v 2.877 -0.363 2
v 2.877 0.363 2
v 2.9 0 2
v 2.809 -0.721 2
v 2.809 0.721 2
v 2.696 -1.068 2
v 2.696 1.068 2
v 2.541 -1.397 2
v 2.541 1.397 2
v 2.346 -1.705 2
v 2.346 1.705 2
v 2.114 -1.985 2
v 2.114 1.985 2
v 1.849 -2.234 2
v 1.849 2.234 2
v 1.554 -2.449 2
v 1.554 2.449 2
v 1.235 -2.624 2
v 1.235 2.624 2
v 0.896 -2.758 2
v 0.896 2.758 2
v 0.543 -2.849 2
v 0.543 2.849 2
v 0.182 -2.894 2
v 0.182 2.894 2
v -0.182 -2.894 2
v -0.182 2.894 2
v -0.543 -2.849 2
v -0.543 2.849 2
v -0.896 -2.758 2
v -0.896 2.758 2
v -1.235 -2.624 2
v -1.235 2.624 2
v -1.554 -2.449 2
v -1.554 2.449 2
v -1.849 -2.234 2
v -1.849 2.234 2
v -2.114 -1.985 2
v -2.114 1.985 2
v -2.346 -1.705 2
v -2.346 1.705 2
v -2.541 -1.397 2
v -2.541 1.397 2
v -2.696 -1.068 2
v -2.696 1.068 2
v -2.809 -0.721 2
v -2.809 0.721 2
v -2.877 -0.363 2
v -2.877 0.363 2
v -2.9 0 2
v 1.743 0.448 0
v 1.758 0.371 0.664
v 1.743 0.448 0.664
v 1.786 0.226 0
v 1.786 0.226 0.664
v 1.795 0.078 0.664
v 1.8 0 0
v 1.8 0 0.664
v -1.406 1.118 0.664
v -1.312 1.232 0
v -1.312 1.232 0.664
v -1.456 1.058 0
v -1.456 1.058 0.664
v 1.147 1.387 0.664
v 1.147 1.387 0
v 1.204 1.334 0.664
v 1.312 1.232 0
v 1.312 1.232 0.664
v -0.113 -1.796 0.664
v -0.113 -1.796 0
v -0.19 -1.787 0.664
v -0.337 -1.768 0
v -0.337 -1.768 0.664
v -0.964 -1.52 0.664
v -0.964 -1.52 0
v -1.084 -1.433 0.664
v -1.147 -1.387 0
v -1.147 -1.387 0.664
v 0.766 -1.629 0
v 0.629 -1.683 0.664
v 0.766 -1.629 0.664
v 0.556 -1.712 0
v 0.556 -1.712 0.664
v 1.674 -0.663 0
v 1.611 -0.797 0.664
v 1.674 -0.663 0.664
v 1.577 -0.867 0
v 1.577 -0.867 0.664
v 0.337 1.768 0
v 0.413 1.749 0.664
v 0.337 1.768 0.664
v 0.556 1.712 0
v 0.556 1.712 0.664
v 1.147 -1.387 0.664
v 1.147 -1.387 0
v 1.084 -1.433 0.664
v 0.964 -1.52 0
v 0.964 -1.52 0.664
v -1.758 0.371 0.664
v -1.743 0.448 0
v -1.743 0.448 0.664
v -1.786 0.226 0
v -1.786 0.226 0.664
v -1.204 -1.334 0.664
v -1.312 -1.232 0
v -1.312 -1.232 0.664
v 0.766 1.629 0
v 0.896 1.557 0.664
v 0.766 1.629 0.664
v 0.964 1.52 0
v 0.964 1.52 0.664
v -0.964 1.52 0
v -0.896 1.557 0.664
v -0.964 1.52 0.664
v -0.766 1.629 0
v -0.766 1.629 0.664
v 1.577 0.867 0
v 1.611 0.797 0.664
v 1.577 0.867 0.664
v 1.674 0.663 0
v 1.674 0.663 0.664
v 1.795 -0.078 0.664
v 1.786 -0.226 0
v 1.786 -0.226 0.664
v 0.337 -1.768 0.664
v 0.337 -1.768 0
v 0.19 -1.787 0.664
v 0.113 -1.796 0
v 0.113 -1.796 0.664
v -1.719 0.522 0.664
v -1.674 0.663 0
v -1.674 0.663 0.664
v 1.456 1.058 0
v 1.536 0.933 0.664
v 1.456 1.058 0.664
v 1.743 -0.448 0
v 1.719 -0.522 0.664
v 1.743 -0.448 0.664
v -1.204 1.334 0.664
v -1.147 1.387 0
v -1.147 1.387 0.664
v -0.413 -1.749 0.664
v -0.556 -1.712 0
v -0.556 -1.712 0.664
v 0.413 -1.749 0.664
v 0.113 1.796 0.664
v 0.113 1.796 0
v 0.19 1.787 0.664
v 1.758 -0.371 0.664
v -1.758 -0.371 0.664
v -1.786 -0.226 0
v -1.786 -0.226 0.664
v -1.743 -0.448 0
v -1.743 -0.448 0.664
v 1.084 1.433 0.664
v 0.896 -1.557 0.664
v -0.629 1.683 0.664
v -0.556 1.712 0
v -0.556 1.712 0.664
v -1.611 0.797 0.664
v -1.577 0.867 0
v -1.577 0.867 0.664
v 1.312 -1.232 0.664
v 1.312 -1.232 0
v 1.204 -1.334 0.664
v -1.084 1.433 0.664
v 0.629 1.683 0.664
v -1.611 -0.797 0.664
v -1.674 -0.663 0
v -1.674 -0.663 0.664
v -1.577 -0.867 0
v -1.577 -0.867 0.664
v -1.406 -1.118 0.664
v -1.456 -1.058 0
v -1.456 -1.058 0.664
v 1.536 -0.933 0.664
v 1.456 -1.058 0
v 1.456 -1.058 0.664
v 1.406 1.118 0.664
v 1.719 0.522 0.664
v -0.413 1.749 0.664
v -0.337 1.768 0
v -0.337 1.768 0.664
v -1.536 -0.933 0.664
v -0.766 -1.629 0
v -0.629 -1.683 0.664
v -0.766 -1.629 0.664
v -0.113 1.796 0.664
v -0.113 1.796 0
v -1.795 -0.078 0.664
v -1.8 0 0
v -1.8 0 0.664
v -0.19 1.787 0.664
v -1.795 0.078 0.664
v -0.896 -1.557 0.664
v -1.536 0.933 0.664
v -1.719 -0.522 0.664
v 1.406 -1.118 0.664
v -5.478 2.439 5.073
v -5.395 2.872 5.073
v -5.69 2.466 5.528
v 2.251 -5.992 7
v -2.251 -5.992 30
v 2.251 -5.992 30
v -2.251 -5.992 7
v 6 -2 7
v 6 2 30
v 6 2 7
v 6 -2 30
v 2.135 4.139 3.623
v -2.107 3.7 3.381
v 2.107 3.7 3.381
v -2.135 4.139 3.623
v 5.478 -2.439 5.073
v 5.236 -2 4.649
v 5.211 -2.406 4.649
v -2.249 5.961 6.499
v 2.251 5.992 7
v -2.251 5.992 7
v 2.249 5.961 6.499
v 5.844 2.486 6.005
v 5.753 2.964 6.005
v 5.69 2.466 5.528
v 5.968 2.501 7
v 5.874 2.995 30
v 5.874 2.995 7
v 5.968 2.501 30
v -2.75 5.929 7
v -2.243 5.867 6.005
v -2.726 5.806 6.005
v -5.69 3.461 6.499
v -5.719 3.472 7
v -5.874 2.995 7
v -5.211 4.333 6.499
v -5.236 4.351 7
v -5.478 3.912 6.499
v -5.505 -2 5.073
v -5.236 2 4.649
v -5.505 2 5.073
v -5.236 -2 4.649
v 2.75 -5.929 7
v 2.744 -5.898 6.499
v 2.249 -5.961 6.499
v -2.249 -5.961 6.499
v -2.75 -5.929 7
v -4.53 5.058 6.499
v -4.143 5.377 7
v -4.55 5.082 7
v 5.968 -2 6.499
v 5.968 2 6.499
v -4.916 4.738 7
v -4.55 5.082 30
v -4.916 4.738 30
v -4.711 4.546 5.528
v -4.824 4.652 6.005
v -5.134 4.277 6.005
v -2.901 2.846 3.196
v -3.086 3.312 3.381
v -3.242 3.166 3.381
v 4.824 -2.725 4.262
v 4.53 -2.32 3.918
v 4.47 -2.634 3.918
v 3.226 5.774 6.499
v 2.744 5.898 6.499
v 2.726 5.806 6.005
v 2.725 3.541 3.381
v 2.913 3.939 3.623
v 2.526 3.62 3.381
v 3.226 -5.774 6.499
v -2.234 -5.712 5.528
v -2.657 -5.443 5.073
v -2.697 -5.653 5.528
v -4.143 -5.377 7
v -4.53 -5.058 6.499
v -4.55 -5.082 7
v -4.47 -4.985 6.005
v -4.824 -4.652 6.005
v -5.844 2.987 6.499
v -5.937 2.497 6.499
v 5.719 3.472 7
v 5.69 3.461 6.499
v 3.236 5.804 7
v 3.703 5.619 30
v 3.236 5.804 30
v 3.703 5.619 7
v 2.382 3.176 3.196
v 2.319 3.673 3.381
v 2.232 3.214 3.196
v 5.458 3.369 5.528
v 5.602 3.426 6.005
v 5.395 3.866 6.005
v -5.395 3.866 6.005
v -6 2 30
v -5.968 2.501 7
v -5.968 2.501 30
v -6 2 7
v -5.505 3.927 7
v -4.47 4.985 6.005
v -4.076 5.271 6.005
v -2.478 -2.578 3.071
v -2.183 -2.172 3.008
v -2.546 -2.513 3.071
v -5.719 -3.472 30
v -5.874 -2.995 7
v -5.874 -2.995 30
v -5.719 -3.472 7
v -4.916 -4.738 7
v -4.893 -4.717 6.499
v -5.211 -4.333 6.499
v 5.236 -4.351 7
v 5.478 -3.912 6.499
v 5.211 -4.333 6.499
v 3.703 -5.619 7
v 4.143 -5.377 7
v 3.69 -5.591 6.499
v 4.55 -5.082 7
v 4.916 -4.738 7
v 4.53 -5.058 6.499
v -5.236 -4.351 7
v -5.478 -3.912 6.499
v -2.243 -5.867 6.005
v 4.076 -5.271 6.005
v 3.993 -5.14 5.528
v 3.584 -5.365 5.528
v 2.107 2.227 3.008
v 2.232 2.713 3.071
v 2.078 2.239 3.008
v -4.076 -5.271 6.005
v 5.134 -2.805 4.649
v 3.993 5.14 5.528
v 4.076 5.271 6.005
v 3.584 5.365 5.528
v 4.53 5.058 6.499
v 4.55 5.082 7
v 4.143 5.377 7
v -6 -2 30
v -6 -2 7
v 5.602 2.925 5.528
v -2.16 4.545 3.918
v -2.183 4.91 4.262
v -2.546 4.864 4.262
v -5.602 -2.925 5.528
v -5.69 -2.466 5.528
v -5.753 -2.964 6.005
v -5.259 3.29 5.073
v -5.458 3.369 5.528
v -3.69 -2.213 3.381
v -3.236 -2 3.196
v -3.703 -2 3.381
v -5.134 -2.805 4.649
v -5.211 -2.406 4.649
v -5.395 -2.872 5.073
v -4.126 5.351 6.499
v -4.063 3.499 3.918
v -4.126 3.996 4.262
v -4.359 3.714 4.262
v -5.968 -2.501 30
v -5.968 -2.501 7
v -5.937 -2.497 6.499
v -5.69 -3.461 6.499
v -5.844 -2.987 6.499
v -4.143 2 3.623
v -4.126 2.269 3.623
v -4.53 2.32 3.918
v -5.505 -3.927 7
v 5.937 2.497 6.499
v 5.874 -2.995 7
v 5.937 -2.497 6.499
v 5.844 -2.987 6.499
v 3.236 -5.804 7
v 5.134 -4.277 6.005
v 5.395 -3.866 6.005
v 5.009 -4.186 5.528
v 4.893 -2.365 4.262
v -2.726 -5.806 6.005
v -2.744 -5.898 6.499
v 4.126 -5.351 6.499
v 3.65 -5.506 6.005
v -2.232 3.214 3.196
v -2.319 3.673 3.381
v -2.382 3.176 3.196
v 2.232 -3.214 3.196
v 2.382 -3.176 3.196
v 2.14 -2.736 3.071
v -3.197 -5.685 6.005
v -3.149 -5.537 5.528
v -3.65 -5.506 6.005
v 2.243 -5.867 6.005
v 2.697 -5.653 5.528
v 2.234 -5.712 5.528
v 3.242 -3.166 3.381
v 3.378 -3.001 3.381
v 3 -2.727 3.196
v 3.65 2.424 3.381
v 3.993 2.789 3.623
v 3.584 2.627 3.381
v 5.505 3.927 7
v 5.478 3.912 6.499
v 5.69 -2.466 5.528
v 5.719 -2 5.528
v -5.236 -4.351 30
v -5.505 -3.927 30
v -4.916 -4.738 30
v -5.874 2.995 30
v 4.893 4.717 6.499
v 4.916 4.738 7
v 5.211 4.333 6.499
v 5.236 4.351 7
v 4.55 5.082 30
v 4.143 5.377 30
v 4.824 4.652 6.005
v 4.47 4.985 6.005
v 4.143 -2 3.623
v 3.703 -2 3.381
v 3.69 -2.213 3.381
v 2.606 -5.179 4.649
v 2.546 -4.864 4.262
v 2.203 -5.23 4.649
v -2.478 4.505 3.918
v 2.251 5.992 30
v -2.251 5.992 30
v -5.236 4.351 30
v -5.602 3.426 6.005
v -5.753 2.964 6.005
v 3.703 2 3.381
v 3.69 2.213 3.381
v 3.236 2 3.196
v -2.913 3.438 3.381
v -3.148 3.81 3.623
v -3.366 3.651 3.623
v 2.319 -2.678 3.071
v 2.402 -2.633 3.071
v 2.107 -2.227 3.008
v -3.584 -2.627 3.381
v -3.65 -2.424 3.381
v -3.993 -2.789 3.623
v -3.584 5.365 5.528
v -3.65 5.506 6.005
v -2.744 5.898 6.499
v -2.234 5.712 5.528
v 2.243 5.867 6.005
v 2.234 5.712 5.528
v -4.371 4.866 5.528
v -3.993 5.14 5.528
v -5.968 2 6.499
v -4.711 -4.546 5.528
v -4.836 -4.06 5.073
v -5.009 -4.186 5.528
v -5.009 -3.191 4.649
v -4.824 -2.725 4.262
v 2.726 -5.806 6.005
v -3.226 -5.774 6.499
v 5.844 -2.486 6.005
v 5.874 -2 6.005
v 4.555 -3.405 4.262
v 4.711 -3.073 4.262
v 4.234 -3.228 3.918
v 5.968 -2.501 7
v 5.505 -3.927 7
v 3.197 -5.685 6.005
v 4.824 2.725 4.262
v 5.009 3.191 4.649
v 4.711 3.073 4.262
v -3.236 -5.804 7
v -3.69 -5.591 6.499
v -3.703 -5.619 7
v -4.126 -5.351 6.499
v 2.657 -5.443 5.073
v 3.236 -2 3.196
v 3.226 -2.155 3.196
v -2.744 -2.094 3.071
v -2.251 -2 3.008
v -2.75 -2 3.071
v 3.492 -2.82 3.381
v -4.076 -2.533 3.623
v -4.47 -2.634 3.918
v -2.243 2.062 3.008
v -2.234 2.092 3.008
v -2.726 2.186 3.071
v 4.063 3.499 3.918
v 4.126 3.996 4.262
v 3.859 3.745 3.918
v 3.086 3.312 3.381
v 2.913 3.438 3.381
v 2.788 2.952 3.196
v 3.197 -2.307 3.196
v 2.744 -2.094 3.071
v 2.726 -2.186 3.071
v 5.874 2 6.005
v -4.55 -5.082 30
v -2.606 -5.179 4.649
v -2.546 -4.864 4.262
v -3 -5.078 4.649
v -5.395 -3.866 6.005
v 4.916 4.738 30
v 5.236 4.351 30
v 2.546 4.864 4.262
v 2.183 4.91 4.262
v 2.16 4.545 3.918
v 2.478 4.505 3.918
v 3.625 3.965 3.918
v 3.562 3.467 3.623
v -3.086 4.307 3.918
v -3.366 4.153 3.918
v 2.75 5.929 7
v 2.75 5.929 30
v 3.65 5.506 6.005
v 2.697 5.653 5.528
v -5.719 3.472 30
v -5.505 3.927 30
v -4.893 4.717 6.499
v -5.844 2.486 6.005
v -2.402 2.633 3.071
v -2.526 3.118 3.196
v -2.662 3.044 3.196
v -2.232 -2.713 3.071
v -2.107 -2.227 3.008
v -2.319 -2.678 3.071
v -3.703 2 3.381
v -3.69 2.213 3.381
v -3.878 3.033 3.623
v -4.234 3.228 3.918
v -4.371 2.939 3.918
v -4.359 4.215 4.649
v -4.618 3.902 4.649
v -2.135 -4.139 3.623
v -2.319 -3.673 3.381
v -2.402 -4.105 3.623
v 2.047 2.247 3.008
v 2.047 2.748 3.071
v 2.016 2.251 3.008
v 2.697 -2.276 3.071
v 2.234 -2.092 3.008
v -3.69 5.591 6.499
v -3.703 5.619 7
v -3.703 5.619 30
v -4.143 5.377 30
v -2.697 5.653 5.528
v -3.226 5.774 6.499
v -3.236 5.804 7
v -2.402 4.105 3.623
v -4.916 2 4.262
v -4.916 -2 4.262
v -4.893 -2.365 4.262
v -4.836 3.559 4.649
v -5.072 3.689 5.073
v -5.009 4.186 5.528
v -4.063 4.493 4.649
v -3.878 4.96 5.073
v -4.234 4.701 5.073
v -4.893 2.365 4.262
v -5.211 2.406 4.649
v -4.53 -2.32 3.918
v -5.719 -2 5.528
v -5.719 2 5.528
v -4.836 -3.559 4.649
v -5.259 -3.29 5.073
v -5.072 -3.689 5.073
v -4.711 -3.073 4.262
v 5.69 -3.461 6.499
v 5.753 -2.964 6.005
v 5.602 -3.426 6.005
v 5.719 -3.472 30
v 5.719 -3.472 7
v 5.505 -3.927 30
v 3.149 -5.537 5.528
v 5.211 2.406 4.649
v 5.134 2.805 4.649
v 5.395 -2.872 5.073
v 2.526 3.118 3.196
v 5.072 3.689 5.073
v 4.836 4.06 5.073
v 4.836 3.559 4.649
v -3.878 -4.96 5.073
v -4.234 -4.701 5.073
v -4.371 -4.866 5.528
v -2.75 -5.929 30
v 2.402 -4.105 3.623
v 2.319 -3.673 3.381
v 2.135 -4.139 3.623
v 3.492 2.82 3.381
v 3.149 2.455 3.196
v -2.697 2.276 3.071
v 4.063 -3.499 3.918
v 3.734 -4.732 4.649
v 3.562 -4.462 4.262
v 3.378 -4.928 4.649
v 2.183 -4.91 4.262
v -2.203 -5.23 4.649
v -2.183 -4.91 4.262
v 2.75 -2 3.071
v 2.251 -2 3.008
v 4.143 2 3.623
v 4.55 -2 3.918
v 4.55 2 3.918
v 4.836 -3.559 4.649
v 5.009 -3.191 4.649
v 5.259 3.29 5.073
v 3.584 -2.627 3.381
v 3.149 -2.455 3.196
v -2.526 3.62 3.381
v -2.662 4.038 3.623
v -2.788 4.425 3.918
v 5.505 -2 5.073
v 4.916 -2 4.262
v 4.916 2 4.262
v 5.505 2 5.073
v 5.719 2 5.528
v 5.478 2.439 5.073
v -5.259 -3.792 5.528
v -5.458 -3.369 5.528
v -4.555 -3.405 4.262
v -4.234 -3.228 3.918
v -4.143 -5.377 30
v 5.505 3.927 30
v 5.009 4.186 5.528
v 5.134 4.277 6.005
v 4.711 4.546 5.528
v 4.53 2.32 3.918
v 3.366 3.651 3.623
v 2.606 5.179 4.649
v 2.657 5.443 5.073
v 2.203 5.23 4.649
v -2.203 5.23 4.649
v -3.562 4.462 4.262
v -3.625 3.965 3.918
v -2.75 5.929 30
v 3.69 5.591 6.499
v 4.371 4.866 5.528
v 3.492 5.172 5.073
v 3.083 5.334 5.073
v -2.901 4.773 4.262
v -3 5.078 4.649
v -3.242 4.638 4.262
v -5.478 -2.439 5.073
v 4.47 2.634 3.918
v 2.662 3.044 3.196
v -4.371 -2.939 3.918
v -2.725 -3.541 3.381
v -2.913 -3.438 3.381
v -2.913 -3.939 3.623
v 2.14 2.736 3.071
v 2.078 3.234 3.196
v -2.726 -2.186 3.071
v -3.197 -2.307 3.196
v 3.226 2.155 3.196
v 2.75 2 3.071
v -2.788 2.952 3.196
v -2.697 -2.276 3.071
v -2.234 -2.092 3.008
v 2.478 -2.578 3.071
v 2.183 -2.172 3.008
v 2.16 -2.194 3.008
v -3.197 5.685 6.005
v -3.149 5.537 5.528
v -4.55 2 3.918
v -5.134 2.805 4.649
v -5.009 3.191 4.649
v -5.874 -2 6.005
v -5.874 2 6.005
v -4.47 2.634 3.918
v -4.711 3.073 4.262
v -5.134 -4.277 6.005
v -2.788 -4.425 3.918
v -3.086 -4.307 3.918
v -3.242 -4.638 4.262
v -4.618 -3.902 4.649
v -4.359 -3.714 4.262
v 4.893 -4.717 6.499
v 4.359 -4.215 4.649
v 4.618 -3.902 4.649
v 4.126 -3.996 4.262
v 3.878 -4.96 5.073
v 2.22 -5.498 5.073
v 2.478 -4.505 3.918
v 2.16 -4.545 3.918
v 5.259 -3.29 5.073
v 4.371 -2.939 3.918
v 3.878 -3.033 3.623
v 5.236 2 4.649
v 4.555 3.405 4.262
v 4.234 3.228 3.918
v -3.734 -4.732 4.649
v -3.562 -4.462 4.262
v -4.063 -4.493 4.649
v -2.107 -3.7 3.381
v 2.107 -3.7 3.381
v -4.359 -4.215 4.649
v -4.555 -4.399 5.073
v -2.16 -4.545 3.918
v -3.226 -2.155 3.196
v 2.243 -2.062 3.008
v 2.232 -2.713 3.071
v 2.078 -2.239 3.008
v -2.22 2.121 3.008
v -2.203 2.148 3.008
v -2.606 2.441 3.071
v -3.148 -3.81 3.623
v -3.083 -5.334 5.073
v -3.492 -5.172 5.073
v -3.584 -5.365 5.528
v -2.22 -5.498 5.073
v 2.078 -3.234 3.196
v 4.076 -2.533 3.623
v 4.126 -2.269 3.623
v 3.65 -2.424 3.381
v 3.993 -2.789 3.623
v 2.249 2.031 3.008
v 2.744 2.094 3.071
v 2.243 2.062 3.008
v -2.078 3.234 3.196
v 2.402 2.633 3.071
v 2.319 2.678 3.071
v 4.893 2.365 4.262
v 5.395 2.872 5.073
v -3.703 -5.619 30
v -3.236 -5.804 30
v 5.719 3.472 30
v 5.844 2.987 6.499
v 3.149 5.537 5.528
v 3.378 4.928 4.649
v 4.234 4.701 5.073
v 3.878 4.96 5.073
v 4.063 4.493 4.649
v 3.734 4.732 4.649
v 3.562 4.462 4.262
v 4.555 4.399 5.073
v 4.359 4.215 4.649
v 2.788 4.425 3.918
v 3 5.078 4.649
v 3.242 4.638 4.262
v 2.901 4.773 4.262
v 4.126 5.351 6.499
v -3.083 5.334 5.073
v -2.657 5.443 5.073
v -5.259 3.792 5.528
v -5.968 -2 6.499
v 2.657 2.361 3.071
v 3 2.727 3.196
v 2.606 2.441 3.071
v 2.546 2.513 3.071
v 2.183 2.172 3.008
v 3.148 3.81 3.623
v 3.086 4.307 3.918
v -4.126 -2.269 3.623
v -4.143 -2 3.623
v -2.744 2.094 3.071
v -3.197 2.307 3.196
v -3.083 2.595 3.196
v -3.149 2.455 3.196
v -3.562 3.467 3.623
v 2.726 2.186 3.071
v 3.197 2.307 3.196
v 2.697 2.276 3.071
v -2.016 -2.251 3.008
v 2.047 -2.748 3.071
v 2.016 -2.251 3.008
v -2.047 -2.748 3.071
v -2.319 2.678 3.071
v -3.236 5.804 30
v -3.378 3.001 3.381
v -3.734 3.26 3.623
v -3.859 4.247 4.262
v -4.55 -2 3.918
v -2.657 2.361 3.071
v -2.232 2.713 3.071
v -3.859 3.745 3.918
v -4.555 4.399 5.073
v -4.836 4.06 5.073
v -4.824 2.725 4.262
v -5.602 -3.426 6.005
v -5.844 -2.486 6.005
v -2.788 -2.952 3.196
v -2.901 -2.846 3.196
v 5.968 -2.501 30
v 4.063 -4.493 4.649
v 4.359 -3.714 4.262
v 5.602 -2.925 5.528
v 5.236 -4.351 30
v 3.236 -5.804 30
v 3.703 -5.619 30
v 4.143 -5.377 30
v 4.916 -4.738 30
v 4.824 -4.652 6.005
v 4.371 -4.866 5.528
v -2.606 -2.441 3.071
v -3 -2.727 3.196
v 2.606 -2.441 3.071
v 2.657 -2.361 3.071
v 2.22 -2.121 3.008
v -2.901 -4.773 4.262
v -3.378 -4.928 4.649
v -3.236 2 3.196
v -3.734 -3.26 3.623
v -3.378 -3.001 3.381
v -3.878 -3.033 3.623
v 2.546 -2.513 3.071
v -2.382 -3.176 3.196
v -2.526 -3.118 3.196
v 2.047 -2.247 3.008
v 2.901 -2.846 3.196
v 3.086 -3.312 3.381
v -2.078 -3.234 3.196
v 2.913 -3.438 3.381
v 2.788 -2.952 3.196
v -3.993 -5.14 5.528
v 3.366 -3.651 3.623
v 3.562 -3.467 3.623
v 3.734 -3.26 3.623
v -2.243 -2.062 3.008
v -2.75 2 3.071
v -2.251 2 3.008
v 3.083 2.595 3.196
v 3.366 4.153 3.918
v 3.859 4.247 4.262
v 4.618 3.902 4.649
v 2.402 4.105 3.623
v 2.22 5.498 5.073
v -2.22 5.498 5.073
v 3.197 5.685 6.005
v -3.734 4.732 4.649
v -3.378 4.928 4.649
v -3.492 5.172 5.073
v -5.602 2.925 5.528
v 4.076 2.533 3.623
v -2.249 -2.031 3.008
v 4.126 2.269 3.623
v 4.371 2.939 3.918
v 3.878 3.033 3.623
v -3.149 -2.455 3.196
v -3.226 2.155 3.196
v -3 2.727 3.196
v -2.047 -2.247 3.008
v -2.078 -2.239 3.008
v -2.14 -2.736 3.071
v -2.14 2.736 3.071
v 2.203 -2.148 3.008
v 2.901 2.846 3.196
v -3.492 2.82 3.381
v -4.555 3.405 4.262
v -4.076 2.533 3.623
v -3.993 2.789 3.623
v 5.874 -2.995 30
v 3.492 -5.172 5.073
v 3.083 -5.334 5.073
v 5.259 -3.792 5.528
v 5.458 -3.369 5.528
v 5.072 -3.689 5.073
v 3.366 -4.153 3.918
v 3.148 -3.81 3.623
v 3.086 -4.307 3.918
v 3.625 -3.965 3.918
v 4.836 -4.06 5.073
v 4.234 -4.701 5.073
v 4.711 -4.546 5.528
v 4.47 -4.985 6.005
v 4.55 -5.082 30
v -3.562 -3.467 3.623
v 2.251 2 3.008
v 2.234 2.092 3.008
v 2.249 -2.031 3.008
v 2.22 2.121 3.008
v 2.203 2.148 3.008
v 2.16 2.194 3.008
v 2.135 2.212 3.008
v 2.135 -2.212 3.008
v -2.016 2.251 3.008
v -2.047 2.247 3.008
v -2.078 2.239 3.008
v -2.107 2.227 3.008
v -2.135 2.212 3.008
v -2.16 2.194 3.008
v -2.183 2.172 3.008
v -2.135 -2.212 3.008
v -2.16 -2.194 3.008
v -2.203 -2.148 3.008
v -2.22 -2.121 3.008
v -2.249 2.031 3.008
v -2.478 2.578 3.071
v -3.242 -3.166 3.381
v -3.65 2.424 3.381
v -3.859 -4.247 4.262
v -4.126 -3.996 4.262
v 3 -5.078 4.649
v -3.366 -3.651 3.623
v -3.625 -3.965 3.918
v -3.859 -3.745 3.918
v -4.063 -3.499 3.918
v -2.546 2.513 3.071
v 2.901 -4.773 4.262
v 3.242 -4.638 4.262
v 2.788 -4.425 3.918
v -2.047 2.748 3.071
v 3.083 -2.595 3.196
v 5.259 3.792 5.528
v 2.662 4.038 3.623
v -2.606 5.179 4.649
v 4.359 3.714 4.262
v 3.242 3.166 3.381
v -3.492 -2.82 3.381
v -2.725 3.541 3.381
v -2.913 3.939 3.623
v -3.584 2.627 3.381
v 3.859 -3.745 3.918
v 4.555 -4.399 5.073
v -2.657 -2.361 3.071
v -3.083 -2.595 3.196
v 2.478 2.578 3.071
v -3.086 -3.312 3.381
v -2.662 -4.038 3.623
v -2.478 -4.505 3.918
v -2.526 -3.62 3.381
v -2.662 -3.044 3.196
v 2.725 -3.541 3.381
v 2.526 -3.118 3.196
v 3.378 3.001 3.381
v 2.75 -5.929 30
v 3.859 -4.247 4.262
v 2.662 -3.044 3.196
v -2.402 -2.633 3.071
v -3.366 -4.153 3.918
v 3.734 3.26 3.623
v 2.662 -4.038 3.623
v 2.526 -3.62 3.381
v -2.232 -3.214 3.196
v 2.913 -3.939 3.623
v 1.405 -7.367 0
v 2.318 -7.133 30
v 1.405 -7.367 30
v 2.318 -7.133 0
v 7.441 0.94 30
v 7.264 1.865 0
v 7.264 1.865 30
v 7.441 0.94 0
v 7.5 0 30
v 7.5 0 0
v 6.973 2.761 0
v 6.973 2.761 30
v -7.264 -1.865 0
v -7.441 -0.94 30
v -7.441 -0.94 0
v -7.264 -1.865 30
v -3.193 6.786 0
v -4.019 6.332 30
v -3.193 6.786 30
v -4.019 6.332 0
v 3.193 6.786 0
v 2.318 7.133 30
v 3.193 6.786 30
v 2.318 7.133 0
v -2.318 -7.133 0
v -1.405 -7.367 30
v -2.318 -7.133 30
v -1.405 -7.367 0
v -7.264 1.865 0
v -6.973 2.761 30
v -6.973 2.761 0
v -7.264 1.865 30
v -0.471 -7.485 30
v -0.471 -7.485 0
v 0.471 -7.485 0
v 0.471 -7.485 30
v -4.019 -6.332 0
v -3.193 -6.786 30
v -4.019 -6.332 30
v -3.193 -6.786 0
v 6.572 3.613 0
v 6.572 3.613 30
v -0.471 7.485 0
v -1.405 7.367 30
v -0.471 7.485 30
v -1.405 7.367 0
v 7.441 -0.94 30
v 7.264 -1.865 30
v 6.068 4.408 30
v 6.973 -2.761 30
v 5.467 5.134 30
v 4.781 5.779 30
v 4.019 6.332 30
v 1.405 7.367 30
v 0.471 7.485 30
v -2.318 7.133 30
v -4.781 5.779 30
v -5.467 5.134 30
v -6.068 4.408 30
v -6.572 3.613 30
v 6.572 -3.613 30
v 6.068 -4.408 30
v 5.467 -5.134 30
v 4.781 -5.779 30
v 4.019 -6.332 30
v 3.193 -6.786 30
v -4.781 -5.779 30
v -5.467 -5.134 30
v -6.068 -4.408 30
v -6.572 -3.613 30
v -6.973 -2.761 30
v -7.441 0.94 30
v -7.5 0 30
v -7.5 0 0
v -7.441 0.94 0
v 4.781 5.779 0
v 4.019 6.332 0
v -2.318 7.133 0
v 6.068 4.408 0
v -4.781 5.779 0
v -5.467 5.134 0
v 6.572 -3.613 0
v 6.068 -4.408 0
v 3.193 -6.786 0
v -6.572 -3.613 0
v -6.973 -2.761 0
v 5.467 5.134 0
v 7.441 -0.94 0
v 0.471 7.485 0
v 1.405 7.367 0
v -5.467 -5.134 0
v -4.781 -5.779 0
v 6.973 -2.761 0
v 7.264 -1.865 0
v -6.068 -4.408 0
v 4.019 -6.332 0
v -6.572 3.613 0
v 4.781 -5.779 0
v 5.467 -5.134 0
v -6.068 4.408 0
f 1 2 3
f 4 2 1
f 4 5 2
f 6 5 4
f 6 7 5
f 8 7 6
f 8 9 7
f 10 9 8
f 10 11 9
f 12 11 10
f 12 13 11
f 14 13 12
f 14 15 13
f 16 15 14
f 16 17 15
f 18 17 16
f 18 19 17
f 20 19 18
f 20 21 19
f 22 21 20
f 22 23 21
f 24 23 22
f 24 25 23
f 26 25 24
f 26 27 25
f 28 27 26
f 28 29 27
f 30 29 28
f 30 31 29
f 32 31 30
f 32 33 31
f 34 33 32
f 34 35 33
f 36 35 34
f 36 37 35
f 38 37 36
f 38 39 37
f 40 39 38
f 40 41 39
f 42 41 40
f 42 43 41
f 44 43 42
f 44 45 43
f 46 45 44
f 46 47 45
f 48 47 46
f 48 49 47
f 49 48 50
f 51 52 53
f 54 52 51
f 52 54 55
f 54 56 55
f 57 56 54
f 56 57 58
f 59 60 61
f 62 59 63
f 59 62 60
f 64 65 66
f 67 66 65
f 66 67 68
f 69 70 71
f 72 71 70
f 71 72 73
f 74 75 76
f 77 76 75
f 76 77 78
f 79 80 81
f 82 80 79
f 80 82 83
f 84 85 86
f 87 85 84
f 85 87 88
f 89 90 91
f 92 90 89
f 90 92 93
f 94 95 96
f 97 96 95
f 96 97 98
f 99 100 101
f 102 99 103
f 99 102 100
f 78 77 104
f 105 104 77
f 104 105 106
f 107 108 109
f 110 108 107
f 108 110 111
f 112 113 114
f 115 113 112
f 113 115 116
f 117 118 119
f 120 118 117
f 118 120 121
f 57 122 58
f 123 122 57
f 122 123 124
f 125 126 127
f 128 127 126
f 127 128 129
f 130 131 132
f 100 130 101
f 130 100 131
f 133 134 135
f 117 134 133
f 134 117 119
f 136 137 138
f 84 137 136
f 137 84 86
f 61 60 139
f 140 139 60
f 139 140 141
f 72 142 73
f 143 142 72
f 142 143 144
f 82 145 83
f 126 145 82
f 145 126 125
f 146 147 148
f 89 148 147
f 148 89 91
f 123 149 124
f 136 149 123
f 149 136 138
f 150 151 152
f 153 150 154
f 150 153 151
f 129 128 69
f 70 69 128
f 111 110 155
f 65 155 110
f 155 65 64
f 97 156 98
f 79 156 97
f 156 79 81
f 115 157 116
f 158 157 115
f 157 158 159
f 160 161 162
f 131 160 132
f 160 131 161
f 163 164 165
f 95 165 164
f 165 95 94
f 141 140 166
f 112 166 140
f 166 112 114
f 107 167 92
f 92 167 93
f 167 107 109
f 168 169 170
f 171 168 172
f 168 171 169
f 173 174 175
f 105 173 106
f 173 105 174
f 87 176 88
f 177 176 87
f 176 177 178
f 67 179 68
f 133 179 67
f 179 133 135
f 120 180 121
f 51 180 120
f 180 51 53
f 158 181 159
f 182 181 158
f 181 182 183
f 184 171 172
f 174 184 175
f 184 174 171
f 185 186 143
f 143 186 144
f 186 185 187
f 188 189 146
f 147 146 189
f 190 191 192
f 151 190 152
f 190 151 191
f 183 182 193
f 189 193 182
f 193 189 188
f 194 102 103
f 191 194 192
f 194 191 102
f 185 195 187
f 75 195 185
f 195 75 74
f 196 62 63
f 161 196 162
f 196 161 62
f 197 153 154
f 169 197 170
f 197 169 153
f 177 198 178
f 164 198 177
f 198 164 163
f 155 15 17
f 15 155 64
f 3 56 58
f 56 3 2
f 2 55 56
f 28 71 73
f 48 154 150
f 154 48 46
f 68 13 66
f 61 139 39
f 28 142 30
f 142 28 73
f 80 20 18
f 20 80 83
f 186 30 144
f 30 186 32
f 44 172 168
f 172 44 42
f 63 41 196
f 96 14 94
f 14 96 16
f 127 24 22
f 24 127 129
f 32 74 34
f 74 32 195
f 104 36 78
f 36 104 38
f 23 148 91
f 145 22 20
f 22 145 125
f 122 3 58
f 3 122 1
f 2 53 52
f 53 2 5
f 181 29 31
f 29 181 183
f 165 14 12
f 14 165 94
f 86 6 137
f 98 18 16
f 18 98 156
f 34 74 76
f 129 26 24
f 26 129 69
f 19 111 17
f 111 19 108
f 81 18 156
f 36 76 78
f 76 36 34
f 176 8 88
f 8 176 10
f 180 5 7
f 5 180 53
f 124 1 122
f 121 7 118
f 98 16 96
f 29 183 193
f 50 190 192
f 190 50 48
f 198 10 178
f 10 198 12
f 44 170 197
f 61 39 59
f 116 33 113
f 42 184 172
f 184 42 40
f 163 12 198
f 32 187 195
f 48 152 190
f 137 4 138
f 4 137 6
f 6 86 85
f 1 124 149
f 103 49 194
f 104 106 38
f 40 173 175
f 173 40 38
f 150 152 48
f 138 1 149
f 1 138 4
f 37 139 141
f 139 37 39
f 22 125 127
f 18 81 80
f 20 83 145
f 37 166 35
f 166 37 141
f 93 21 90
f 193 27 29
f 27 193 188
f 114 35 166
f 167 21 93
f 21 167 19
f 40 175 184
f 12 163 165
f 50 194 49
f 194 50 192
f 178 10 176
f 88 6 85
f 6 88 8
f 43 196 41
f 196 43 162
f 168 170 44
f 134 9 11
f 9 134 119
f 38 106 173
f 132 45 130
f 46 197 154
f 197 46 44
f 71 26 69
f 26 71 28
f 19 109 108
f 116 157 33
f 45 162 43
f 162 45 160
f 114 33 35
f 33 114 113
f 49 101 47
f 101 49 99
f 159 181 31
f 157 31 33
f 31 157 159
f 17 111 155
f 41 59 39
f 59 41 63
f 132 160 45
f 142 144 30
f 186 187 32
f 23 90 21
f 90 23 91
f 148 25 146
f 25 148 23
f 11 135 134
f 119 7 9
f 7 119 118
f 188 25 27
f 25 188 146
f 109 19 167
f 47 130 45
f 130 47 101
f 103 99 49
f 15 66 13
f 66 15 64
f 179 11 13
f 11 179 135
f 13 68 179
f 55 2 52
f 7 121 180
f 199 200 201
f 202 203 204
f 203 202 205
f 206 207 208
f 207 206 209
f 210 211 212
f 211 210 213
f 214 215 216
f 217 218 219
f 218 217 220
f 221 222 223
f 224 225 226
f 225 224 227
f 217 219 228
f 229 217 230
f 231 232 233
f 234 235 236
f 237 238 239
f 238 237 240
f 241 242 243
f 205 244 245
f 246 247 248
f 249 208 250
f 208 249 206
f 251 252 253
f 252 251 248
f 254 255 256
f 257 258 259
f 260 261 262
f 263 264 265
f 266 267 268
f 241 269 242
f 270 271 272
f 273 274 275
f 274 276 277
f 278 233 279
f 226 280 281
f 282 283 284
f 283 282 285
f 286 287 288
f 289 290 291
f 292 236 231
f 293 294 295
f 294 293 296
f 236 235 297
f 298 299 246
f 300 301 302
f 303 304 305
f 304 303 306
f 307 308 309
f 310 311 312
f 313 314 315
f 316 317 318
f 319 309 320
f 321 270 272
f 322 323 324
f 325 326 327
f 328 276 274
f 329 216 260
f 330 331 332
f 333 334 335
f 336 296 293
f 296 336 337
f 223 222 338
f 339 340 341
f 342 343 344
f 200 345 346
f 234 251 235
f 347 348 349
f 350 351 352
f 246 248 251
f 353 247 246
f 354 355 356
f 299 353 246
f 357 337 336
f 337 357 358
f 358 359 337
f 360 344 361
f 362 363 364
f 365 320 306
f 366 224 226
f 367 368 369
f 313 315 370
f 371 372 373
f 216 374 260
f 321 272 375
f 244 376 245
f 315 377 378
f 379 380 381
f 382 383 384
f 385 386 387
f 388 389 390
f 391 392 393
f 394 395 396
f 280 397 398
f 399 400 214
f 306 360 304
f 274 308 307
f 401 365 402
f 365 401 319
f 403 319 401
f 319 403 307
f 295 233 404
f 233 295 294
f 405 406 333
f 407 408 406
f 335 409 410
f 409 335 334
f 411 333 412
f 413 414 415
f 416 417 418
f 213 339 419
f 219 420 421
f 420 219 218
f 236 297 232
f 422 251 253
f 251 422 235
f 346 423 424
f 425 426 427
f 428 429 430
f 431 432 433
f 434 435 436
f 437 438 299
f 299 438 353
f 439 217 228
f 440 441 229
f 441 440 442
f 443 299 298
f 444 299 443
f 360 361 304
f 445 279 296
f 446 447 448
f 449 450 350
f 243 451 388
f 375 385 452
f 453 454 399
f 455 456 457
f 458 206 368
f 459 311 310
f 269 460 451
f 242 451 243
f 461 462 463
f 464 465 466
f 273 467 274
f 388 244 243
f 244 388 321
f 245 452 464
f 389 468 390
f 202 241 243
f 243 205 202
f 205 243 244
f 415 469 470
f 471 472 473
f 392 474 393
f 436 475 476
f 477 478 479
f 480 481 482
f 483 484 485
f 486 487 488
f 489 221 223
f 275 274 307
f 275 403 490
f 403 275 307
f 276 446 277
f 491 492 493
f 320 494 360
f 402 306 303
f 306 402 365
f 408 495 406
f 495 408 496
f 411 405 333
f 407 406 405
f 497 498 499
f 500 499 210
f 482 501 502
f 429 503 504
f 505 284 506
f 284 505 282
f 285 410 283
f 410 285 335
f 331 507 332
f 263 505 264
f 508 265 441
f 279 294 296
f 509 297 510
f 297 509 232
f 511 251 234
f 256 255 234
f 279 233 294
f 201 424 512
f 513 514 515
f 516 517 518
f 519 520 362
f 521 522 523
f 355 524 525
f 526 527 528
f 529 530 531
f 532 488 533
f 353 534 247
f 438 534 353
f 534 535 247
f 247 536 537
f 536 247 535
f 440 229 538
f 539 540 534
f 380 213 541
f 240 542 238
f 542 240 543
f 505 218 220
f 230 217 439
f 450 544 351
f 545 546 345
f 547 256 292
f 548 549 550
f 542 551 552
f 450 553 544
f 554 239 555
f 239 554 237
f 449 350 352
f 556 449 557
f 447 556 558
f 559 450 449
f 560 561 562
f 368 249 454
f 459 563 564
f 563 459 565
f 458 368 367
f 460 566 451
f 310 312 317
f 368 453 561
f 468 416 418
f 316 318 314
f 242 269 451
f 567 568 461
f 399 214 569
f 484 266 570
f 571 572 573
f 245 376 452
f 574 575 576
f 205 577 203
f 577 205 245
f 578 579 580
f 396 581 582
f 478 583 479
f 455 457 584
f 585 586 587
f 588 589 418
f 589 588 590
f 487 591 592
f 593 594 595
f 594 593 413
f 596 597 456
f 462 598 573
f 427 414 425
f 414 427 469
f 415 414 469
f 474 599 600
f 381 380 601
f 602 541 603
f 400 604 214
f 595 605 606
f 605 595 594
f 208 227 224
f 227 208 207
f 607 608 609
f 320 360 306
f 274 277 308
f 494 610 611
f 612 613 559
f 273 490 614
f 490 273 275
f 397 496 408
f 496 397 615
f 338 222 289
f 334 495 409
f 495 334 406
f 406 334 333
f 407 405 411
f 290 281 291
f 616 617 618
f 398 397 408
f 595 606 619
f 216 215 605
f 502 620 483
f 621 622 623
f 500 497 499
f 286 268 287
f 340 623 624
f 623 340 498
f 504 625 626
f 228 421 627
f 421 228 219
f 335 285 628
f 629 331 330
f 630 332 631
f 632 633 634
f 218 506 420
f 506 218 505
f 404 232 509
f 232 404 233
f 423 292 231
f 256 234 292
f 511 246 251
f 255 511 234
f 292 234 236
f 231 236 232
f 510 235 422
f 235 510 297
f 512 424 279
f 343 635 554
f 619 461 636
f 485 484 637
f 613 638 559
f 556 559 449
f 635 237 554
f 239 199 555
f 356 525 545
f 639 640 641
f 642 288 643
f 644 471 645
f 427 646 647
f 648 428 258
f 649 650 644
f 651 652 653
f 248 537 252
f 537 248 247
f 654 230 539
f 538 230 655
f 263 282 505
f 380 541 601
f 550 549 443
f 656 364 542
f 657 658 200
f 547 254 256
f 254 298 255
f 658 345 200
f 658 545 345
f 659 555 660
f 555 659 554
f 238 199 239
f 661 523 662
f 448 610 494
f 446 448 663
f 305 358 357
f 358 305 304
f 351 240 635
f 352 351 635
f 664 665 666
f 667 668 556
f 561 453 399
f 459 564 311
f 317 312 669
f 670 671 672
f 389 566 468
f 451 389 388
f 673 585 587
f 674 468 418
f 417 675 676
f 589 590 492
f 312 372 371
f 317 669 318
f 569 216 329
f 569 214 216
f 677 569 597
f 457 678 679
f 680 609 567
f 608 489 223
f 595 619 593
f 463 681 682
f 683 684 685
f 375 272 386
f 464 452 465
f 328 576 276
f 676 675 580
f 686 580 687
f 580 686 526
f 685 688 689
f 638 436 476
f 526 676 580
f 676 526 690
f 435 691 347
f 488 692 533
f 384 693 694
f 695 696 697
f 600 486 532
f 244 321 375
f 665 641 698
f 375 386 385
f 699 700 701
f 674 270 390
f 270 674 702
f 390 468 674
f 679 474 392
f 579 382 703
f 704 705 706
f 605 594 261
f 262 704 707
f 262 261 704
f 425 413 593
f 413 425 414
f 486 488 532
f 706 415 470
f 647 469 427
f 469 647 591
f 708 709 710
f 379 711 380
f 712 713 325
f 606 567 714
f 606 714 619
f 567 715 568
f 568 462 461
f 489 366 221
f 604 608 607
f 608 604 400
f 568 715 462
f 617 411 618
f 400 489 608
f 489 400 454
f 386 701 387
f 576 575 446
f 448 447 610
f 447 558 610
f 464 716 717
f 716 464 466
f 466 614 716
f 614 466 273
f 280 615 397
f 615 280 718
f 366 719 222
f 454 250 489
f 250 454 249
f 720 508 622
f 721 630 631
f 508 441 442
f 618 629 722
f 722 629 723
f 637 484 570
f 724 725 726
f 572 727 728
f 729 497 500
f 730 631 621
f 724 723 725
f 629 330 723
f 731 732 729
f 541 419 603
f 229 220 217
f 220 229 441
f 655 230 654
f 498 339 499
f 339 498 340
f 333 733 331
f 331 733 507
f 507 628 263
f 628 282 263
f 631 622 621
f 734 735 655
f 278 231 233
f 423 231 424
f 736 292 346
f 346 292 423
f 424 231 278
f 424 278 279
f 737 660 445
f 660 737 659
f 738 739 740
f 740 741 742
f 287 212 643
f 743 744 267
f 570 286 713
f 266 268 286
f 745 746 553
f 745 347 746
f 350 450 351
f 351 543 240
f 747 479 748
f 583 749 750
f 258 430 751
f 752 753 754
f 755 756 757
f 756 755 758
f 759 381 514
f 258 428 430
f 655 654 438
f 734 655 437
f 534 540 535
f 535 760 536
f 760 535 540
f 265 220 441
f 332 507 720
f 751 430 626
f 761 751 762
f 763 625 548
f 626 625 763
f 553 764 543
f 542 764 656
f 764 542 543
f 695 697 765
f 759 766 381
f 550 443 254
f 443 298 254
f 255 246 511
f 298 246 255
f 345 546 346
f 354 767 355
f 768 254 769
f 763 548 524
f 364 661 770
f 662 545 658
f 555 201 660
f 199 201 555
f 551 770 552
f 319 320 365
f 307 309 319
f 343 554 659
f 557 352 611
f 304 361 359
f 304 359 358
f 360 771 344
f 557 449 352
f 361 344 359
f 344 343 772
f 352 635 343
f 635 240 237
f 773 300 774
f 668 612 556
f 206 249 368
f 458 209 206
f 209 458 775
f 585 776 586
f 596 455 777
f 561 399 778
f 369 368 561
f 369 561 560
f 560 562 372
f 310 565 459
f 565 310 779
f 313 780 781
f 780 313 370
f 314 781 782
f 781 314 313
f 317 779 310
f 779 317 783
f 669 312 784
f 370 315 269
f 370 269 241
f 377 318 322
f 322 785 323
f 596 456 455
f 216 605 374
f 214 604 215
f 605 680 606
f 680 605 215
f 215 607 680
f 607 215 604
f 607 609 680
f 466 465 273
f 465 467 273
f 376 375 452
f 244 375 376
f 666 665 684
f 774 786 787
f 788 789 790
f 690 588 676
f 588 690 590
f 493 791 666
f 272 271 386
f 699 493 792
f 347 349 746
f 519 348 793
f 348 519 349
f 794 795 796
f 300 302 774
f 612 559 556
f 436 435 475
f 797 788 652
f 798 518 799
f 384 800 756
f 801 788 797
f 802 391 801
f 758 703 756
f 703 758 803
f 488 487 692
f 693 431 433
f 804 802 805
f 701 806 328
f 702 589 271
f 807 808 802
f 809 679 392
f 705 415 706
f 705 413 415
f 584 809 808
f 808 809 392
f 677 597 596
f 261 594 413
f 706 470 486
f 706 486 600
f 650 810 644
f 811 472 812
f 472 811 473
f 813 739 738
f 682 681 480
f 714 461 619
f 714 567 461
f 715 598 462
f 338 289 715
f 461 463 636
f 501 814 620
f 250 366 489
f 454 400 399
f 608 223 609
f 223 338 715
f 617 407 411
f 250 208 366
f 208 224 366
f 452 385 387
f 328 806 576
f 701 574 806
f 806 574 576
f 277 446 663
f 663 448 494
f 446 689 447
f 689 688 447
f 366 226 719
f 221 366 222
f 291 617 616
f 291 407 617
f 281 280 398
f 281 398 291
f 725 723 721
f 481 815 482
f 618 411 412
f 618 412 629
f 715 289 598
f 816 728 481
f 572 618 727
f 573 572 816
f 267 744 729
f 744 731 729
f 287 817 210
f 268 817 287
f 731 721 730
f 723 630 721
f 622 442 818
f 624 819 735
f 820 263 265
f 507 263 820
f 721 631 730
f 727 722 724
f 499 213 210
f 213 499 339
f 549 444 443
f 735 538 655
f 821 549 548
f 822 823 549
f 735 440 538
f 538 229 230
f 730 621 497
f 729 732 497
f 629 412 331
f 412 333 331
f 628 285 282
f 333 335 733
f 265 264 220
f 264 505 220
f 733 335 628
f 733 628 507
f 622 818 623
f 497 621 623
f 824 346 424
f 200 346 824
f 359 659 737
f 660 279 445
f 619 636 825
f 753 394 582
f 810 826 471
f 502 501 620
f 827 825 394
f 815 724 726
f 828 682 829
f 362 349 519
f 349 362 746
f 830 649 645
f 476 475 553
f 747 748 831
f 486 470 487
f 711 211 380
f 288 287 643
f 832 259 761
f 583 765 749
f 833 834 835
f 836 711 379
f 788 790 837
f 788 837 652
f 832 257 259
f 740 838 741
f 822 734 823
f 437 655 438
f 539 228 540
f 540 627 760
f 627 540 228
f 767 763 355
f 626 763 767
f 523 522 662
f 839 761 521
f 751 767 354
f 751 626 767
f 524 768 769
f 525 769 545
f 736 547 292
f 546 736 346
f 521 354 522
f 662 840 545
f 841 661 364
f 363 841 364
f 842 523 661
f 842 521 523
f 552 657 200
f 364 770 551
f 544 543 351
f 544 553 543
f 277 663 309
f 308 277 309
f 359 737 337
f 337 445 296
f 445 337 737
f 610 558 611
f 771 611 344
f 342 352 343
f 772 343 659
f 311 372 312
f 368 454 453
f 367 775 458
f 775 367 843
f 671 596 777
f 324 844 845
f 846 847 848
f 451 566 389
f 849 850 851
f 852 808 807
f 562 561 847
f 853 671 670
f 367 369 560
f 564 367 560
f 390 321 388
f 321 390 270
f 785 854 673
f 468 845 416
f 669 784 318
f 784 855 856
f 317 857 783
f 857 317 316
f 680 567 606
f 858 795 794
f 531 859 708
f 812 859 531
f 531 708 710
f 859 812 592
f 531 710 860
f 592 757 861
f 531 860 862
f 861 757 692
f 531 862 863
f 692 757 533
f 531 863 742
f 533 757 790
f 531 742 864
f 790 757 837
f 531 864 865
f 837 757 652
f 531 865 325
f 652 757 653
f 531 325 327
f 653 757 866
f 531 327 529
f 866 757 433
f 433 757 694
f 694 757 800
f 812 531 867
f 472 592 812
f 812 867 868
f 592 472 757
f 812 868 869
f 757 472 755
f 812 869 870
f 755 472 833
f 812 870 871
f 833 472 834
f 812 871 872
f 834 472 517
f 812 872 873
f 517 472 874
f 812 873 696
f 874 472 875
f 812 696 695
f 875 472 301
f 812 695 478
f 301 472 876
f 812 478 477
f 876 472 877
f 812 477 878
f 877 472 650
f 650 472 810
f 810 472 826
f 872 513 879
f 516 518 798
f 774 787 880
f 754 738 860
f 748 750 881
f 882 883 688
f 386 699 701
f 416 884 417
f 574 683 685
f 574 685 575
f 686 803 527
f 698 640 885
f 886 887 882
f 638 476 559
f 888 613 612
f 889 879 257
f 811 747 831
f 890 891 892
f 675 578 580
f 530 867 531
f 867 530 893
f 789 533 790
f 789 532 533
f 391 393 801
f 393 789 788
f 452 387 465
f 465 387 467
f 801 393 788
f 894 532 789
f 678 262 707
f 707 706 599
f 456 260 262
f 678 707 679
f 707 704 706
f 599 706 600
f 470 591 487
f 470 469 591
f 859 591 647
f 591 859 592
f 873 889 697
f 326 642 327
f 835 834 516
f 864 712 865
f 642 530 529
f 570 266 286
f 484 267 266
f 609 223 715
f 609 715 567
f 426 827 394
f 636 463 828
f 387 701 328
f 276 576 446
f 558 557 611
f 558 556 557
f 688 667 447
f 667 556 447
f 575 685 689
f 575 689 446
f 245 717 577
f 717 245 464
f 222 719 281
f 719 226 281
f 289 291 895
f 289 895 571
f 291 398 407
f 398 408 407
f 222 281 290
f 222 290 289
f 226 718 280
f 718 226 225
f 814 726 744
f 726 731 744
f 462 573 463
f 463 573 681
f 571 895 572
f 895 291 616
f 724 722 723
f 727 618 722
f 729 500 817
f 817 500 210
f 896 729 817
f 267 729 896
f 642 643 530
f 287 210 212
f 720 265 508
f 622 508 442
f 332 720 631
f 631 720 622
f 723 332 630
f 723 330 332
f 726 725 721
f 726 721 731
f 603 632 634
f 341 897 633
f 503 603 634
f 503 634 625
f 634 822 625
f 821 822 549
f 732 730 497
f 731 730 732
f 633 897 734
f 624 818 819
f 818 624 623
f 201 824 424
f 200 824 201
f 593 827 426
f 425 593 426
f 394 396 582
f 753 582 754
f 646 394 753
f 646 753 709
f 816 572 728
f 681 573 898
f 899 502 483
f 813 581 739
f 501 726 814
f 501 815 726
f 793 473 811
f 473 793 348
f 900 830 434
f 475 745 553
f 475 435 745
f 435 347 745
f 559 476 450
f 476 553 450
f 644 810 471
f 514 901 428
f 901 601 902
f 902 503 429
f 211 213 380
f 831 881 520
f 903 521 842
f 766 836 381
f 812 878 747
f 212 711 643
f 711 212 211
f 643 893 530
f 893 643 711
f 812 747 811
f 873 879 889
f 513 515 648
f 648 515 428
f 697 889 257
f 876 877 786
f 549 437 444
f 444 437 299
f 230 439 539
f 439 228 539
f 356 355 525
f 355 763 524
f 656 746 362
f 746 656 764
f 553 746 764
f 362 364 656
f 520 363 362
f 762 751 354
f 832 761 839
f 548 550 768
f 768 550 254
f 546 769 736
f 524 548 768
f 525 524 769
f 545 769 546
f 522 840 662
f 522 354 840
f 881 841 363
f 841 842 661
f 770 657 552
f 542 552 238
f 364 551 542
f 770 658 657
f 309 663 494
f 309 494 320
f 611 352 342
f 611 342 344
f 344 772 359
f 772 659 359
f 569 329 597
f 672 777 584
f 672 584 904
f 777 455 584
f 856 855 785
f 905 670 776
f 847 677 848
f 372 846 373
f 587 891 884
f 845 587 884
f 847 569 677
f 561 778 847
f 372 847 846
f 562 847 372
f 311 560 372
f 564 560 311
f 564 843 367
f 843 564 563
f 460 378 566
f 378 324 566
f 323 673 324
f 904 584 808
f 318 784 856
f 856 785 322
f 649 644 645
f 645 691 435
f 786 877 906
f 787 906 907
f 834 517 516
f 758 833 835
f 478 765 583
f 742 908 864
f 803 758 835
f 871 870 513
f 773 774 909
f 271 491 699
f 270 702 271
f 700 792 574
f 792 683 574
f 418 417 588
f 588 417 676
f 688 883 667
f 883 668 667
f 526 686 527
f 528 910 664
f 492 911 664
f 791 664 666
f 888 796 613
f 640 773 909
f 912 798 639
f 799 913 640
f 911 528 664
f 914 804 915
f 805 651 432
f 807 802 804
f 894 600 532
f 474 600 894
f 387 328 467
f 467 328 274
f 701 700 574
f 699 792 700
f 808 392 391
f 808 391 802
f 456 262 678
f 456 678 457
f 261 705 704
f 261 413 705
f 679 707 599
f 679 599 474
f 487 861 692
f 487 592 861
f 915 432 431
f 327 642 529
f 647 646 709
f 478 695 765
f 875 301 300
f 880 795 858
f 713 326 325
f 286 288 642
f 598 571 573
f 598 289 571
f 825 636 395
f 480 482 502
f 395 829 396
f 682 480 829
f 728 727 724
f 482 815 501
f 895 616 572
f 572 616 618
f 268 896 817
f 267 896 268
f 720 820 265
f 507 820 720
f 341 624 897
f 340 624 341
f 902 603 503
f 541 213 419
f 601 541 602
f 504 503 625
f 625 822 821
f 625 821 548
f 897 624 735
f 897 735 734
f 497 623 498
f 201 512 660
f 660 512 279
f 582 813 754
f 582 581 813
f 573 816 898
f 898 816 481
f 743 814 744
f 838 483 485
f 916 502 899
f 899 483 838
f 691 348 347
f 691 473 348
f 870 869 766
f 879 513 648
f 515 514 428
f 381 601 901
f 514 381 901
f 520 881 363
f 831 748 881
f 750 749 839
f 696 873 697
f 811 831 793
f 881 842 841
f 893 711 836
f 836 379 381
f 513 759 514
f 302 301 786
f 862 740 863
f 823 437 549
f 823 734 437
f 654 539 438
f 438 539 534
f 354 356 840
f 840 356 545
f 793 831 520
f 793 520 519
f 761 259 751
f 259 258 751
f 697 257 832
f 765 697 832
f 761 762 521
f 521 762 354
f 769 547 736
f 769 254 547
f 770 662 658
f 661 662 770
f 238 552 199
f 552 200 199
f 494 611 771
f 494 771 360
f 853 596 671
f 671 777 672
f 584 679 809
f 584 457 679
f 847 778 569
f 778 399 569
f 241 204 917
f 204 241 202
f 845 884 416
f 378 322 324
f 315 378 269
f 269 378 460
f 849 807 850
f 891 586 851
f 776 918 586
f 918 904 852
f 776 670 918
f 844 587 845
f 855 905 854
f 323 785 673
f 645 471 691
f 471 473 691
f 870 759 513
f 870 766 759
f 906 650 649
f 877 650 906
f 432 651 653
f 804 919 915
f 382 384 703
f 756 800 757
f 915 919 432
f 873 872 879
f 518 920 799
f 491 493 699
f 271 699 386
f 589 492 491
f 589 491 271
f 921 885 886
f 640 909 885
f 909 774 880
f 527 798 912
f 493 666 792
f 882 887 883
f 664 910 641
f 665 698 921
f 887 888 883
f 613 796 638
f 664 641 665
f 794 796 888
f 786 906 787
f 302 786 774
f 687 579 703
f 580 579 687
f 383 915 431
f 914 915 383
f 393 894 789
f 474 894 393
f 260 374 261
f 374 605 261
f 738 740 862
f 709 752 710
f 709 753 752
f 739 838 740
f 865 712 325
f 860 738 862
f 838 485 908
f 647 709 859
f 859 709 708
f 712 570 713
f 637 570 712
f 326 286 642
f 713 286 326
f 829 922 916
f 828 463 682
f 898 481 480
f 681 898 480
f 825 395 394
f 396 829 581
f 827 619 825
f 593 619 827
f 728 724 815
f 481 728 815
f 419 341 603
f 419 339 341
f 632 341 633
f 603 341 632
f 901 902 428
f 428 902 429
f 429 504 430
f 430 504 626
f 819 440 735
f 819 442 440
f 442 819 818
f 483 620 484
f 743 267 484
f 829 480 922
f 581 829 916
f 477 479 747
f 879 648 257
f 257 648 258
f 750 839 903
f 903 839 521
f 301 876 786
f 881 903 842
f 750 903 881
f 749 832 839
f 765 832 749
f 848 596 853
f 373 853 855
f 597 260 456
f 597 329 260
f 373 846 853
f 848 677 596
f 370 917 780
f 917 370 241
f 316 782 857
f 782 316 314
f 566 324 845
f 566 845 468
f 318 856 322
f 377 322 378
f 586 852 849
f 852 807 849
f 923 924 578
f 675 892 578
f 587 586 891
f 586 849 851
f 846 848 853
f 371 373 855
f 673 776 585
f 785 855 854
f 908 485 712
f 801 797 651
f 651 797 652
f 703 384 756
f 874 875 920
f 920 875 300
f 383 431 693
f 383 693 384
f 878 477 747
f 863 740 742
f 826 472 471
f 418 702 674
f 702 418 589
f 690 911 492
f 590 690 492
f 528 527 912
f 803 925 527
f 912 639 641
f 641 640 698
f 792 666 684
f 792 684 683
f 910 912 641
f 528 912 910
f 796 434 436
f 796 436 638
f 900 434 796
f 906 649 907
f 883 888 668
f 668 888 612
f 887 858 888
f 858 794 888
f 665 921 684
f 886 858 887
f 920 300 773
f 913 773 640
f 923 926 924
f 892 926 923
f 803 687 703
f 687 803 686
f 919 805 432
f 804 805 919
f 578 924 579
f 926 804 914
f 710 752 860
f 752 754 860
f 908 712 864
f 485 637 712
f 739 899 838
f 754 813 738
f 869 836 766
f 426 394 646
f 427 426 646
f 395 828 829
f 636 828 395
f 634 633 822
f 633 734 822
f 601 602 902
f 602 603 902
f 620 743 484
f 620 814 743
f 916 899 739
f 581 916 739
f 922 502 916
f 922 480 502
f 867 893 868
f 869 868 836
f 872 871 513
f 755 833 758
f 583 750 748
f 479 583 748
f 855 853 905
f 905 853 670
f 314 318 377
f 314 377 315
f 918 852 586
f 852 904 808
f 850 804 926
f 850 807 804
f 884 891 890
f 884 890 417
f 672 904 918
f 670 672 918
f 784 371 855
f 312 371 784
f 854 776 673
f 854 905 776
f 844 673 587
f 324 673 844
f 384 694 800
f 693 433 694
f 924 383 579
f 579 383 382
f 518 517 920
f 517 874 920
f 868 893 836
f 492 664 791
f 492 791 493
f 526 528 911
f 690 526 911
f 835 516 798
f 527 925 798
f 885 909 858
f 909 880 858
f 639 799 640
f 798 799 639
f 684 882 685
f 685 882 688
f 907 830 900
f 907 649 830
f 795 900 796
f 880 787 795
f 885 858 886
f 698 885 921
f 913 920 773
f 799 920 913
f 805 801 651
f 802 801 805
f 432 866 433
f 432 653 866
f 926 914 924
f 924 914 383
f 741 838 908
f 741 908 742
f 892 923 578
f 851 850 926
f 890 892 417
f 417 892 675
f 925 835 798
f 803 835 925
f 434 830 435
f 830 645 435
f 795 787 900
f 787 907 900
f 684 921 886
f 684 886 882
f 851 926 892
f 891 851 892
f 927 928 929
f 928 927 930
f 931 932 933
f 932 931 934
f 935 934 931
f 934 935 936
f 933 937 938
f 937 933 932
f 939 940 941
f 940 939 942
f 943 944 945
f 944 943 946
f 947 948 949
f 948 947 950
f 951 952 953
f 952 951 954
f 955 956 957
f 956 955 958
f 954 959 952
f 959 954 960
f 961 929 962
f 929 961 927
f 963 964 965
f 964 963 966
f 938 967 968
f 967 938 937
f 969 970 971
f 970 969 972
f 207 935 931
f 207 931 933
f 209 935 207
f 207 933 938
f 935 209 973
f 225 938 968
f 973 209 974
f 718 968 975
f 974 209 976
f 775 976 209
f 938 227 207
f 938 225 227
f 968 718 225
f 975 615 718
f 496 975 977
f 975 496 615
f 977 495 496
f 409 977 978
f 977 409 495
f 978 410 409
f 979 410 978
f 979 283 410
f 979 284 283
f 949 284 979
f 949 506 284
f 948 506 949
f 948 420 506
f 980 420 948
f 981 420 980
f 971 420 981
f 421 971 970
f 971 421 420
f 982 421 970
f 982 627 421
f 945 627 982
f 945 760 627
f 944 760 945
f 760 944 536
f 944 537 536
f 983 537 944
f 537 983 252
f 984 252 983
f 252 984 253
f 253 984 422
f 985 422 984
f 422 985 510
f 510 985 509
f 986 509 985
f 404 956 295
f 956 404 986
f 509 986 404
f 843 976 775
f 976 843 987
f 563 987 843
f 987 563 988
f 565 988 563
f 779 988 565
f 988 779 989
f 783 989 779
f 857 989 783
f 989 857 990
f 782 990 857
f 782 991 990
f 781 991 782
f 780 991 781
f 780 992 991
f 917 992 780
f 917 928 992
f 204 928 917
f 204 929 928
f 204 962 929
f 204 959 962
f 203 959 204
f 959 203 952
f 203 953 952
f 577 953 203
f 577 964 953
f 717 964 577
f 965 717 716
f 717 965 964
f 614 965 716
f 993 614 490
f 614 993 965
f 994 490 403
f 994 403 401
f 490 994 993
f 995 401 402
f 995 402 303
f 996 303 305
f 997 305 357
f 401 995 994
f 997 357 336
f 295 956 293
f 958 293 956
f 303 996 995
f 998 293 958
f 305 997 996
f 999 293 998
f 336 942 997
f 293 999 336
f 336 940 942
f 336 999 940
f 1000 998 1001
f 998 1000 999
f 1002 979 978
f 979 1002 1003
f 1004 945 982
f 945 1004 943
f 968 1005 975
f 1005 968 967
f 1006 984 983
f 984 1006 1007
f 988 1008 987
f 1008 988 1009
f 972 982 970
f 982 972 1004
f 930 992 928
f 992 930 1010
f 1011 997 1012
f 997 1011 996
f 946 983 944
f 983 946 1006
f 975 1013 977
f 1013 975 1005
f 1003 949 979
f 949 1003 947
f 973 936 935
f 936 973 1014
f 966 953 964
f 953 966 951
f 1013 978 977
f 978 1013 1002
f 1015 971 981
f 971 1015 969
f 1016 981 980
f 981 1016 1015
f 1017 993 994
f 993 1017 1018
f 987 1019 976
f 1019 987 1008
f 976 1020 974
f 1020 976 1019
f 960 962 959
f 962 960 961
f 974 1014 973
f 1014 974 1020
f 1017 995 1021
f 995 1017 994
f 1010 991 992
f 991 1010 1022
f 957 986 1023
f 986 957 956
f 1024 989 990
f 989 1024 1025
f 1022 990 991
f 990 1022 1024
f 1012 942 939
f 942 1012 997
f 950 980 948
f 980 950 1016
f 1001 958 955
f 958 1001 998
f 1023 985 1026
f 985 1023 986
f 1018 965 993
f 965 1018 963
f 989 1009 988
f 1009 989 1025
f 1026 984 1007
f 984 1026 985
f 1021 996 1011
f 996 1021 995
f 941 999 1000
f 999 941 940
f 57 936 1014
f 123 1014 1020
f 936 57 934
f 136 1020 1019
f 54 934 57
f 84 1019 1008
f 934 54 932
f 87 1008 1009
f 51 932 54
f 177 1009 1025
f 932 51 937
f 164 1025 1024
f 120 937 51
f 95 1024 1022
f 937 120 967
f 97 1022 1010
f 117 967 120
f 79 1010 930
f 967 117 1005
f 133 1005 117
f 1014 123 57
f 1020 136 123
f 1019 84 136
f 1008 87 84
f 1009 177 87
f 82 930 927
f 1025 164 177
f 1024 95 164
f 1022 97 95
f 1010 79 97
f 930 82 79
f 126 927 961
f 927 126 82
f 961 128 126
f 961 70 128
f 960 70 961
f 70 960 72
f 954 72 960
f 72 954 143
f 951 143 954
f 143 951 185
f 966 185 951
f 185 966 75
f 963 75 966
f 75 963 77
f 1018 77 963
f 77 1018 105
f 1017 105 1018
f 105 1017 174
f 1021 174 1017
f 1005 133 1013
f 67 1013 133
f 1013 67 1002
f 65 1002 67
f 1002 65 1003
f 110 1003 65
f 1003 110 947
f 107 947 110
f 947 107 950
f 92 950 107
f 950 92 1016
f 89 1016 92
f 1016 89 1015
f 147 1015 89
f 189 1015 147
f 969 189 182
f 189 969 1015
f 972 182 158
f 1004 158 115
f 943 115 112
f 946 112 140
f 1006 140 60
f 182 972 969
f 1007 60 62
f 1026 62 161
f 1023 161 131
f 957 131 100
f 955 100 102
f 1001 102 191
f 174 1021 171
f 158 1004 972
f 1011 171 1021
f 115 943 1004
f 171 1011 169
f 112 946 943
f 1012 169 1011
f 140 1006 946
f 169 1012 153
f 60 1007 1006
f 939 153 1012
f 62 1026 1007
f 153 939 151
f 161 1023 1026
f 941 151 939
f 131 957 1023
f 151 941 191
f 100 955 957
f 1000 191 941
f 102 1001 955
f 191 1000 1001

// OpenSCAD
$fn = 50;


difference() {
	union() {
		cylinder(h = 30, r = 7.5000000000);
	}
	union() {
		translate(v = [0.0000000000, 0.0000000000, 2]) {
			rotate(a = [0, 0, 0]) {
				difference() {
					union() {
						translate(v = [0, 0, -6.0000000000]) {
							cylinder(h = 6, r = 1.5000000000);
						}
						translate(v = [0, 0, -6.0000000000]) {
							cylinder(h = 6, r = 1.8000000000);
						}
						translate(v = [0, 0, -1.7000000000]) {
							cylinder(h = 1.7000000000, r1 = 1.5000000000, r2 = 2.9000000000);
						}
						translate(v = [0, 0, -6.0000000000]) {
							cylinder(h = 6, r = 1.5000000000);
						}
					}
					union();
				}
			}
		}
		translate(v = [0.0000000000, 0.0000000000, 2]) {
			rotate(a = [0, 0, 0]) {
				difference() {
					union() {
						translate(v = [0, 0, -6.0000000000]) {
							cylinder(h = 6, r = 1.5000000000);
						}
						translate(v = [0, 0, -6.0000000000]) {
							cylinder(h = 6, r = 1.8000000000);
						}
						translate(v = [0, 0, -1.7000000000]) {
							cylinder(h = 1.7000000000, r1 = 1.5000000000, r2 = 2.9000000000);
						}
						translate(v = [0, 0, -6.0000000000]) {
							cylinder(h = 6, r = 1.5000000000);
						}
					}
					union();
				}
			}
		}
		translate(v = [0.0000000000, 0.0000000000, 2]) {
			rotate(a = [0, 0, 0]) {
				difference() {
					union() {
						translate(v = [0, 0, -6.0000000000]) {
							cylinder(h = 6, r = 1.5000000000);
						}
						translate(v = [0, 0, -6.0000000000]) {
							cylinder(h = 6, r = 1.8000000000);
						}
						translate(v = [0, 0, -1.7000000000]) {
							cylinder(h = 1.7000000000, r1 = 1.5000000000, r2 = 2.9000000000);
						}
						translate(v = [0, 0, -6.0000000000]) {
							cylinder(h = 6, r = 1.5000000000);
						}
					}
					union();
				}
			}
		}
		translate(v = [0.0000000000, 0.0000000000, 2]) {
			rotate(a = [0, 0, 0]) {
				difference() {
					union() {
						translate(v = [0, 0, -6.0000000000]) {
							cylinder(h = 6, r = 1.5000000000);
						}
						translate(v = [0, 0, -6.0000000000]) {
							cylinder(h = 6, r = 1.8000000000);
						}
						translate(v = [0, 0, -1.7000000000]) {
							cylinder(h = 1.7000000000, r1 = 1.5000000000, r2 = 2.9000000000);
						}
						translate(v = [0, 0, -6.0000000000]) {
							cylinder(h = 6, r = 1.5000000000);
						}
					}
					union();
				}
			}
		}
		translate(v = [0, 0, 3]) {
			hull() {
				union() {
					translate(v = [-2.0000000000, 2.0000000000, 4]) {
						cylinder(h = 42, r = 4);
					}
					translate(v = [-2.0000000000, 2.0000000000, 4]) {
						sphere(r = 4);
					}
					translate(v = [-2.0000000000, 2.0000000000, 46]) {
						sphere(r = 4);
					}
				}
				union() {
					translate(v = [2.0000000000, 2.0000000000, 4]) {
						cylinder(h = 42, r = 4);
					}
					translate(v = [2.0000000000, 2.0000000000, 4]) {
						sphere(r = 4);
					}
					translate(v = [2.0000000000, 2.0000000000, 46]) {
						sphere(r = 4);
					}
				}
				union() {
					translate(v = [-2.0000000000, -2.0000000000, 4]) {
						cylinder(h = 42, r = 4);
					}
					translate(v = [-2.0000000000, -2.0000000000, 4]) {
						sphere(r = 4);
					}
					translate(v = [-2.0000000000, -2.0000000000, 46]) {
						sphere(r = 4);
					}
				}
				union() {
					translate(v = [2.0000000000, -2.0000000000, 4]) {
						cylinder(h = 42, r = 4);
					}
					translate(v = [2.0000000000, -2.0000000000, 4]) {
						sphere(r = 4);
					}
					translate(v = [2.0000000000, -2.0000000000, 46]) {
						sphere(r = 4);
					}
				}
			}
		}
	}
}
